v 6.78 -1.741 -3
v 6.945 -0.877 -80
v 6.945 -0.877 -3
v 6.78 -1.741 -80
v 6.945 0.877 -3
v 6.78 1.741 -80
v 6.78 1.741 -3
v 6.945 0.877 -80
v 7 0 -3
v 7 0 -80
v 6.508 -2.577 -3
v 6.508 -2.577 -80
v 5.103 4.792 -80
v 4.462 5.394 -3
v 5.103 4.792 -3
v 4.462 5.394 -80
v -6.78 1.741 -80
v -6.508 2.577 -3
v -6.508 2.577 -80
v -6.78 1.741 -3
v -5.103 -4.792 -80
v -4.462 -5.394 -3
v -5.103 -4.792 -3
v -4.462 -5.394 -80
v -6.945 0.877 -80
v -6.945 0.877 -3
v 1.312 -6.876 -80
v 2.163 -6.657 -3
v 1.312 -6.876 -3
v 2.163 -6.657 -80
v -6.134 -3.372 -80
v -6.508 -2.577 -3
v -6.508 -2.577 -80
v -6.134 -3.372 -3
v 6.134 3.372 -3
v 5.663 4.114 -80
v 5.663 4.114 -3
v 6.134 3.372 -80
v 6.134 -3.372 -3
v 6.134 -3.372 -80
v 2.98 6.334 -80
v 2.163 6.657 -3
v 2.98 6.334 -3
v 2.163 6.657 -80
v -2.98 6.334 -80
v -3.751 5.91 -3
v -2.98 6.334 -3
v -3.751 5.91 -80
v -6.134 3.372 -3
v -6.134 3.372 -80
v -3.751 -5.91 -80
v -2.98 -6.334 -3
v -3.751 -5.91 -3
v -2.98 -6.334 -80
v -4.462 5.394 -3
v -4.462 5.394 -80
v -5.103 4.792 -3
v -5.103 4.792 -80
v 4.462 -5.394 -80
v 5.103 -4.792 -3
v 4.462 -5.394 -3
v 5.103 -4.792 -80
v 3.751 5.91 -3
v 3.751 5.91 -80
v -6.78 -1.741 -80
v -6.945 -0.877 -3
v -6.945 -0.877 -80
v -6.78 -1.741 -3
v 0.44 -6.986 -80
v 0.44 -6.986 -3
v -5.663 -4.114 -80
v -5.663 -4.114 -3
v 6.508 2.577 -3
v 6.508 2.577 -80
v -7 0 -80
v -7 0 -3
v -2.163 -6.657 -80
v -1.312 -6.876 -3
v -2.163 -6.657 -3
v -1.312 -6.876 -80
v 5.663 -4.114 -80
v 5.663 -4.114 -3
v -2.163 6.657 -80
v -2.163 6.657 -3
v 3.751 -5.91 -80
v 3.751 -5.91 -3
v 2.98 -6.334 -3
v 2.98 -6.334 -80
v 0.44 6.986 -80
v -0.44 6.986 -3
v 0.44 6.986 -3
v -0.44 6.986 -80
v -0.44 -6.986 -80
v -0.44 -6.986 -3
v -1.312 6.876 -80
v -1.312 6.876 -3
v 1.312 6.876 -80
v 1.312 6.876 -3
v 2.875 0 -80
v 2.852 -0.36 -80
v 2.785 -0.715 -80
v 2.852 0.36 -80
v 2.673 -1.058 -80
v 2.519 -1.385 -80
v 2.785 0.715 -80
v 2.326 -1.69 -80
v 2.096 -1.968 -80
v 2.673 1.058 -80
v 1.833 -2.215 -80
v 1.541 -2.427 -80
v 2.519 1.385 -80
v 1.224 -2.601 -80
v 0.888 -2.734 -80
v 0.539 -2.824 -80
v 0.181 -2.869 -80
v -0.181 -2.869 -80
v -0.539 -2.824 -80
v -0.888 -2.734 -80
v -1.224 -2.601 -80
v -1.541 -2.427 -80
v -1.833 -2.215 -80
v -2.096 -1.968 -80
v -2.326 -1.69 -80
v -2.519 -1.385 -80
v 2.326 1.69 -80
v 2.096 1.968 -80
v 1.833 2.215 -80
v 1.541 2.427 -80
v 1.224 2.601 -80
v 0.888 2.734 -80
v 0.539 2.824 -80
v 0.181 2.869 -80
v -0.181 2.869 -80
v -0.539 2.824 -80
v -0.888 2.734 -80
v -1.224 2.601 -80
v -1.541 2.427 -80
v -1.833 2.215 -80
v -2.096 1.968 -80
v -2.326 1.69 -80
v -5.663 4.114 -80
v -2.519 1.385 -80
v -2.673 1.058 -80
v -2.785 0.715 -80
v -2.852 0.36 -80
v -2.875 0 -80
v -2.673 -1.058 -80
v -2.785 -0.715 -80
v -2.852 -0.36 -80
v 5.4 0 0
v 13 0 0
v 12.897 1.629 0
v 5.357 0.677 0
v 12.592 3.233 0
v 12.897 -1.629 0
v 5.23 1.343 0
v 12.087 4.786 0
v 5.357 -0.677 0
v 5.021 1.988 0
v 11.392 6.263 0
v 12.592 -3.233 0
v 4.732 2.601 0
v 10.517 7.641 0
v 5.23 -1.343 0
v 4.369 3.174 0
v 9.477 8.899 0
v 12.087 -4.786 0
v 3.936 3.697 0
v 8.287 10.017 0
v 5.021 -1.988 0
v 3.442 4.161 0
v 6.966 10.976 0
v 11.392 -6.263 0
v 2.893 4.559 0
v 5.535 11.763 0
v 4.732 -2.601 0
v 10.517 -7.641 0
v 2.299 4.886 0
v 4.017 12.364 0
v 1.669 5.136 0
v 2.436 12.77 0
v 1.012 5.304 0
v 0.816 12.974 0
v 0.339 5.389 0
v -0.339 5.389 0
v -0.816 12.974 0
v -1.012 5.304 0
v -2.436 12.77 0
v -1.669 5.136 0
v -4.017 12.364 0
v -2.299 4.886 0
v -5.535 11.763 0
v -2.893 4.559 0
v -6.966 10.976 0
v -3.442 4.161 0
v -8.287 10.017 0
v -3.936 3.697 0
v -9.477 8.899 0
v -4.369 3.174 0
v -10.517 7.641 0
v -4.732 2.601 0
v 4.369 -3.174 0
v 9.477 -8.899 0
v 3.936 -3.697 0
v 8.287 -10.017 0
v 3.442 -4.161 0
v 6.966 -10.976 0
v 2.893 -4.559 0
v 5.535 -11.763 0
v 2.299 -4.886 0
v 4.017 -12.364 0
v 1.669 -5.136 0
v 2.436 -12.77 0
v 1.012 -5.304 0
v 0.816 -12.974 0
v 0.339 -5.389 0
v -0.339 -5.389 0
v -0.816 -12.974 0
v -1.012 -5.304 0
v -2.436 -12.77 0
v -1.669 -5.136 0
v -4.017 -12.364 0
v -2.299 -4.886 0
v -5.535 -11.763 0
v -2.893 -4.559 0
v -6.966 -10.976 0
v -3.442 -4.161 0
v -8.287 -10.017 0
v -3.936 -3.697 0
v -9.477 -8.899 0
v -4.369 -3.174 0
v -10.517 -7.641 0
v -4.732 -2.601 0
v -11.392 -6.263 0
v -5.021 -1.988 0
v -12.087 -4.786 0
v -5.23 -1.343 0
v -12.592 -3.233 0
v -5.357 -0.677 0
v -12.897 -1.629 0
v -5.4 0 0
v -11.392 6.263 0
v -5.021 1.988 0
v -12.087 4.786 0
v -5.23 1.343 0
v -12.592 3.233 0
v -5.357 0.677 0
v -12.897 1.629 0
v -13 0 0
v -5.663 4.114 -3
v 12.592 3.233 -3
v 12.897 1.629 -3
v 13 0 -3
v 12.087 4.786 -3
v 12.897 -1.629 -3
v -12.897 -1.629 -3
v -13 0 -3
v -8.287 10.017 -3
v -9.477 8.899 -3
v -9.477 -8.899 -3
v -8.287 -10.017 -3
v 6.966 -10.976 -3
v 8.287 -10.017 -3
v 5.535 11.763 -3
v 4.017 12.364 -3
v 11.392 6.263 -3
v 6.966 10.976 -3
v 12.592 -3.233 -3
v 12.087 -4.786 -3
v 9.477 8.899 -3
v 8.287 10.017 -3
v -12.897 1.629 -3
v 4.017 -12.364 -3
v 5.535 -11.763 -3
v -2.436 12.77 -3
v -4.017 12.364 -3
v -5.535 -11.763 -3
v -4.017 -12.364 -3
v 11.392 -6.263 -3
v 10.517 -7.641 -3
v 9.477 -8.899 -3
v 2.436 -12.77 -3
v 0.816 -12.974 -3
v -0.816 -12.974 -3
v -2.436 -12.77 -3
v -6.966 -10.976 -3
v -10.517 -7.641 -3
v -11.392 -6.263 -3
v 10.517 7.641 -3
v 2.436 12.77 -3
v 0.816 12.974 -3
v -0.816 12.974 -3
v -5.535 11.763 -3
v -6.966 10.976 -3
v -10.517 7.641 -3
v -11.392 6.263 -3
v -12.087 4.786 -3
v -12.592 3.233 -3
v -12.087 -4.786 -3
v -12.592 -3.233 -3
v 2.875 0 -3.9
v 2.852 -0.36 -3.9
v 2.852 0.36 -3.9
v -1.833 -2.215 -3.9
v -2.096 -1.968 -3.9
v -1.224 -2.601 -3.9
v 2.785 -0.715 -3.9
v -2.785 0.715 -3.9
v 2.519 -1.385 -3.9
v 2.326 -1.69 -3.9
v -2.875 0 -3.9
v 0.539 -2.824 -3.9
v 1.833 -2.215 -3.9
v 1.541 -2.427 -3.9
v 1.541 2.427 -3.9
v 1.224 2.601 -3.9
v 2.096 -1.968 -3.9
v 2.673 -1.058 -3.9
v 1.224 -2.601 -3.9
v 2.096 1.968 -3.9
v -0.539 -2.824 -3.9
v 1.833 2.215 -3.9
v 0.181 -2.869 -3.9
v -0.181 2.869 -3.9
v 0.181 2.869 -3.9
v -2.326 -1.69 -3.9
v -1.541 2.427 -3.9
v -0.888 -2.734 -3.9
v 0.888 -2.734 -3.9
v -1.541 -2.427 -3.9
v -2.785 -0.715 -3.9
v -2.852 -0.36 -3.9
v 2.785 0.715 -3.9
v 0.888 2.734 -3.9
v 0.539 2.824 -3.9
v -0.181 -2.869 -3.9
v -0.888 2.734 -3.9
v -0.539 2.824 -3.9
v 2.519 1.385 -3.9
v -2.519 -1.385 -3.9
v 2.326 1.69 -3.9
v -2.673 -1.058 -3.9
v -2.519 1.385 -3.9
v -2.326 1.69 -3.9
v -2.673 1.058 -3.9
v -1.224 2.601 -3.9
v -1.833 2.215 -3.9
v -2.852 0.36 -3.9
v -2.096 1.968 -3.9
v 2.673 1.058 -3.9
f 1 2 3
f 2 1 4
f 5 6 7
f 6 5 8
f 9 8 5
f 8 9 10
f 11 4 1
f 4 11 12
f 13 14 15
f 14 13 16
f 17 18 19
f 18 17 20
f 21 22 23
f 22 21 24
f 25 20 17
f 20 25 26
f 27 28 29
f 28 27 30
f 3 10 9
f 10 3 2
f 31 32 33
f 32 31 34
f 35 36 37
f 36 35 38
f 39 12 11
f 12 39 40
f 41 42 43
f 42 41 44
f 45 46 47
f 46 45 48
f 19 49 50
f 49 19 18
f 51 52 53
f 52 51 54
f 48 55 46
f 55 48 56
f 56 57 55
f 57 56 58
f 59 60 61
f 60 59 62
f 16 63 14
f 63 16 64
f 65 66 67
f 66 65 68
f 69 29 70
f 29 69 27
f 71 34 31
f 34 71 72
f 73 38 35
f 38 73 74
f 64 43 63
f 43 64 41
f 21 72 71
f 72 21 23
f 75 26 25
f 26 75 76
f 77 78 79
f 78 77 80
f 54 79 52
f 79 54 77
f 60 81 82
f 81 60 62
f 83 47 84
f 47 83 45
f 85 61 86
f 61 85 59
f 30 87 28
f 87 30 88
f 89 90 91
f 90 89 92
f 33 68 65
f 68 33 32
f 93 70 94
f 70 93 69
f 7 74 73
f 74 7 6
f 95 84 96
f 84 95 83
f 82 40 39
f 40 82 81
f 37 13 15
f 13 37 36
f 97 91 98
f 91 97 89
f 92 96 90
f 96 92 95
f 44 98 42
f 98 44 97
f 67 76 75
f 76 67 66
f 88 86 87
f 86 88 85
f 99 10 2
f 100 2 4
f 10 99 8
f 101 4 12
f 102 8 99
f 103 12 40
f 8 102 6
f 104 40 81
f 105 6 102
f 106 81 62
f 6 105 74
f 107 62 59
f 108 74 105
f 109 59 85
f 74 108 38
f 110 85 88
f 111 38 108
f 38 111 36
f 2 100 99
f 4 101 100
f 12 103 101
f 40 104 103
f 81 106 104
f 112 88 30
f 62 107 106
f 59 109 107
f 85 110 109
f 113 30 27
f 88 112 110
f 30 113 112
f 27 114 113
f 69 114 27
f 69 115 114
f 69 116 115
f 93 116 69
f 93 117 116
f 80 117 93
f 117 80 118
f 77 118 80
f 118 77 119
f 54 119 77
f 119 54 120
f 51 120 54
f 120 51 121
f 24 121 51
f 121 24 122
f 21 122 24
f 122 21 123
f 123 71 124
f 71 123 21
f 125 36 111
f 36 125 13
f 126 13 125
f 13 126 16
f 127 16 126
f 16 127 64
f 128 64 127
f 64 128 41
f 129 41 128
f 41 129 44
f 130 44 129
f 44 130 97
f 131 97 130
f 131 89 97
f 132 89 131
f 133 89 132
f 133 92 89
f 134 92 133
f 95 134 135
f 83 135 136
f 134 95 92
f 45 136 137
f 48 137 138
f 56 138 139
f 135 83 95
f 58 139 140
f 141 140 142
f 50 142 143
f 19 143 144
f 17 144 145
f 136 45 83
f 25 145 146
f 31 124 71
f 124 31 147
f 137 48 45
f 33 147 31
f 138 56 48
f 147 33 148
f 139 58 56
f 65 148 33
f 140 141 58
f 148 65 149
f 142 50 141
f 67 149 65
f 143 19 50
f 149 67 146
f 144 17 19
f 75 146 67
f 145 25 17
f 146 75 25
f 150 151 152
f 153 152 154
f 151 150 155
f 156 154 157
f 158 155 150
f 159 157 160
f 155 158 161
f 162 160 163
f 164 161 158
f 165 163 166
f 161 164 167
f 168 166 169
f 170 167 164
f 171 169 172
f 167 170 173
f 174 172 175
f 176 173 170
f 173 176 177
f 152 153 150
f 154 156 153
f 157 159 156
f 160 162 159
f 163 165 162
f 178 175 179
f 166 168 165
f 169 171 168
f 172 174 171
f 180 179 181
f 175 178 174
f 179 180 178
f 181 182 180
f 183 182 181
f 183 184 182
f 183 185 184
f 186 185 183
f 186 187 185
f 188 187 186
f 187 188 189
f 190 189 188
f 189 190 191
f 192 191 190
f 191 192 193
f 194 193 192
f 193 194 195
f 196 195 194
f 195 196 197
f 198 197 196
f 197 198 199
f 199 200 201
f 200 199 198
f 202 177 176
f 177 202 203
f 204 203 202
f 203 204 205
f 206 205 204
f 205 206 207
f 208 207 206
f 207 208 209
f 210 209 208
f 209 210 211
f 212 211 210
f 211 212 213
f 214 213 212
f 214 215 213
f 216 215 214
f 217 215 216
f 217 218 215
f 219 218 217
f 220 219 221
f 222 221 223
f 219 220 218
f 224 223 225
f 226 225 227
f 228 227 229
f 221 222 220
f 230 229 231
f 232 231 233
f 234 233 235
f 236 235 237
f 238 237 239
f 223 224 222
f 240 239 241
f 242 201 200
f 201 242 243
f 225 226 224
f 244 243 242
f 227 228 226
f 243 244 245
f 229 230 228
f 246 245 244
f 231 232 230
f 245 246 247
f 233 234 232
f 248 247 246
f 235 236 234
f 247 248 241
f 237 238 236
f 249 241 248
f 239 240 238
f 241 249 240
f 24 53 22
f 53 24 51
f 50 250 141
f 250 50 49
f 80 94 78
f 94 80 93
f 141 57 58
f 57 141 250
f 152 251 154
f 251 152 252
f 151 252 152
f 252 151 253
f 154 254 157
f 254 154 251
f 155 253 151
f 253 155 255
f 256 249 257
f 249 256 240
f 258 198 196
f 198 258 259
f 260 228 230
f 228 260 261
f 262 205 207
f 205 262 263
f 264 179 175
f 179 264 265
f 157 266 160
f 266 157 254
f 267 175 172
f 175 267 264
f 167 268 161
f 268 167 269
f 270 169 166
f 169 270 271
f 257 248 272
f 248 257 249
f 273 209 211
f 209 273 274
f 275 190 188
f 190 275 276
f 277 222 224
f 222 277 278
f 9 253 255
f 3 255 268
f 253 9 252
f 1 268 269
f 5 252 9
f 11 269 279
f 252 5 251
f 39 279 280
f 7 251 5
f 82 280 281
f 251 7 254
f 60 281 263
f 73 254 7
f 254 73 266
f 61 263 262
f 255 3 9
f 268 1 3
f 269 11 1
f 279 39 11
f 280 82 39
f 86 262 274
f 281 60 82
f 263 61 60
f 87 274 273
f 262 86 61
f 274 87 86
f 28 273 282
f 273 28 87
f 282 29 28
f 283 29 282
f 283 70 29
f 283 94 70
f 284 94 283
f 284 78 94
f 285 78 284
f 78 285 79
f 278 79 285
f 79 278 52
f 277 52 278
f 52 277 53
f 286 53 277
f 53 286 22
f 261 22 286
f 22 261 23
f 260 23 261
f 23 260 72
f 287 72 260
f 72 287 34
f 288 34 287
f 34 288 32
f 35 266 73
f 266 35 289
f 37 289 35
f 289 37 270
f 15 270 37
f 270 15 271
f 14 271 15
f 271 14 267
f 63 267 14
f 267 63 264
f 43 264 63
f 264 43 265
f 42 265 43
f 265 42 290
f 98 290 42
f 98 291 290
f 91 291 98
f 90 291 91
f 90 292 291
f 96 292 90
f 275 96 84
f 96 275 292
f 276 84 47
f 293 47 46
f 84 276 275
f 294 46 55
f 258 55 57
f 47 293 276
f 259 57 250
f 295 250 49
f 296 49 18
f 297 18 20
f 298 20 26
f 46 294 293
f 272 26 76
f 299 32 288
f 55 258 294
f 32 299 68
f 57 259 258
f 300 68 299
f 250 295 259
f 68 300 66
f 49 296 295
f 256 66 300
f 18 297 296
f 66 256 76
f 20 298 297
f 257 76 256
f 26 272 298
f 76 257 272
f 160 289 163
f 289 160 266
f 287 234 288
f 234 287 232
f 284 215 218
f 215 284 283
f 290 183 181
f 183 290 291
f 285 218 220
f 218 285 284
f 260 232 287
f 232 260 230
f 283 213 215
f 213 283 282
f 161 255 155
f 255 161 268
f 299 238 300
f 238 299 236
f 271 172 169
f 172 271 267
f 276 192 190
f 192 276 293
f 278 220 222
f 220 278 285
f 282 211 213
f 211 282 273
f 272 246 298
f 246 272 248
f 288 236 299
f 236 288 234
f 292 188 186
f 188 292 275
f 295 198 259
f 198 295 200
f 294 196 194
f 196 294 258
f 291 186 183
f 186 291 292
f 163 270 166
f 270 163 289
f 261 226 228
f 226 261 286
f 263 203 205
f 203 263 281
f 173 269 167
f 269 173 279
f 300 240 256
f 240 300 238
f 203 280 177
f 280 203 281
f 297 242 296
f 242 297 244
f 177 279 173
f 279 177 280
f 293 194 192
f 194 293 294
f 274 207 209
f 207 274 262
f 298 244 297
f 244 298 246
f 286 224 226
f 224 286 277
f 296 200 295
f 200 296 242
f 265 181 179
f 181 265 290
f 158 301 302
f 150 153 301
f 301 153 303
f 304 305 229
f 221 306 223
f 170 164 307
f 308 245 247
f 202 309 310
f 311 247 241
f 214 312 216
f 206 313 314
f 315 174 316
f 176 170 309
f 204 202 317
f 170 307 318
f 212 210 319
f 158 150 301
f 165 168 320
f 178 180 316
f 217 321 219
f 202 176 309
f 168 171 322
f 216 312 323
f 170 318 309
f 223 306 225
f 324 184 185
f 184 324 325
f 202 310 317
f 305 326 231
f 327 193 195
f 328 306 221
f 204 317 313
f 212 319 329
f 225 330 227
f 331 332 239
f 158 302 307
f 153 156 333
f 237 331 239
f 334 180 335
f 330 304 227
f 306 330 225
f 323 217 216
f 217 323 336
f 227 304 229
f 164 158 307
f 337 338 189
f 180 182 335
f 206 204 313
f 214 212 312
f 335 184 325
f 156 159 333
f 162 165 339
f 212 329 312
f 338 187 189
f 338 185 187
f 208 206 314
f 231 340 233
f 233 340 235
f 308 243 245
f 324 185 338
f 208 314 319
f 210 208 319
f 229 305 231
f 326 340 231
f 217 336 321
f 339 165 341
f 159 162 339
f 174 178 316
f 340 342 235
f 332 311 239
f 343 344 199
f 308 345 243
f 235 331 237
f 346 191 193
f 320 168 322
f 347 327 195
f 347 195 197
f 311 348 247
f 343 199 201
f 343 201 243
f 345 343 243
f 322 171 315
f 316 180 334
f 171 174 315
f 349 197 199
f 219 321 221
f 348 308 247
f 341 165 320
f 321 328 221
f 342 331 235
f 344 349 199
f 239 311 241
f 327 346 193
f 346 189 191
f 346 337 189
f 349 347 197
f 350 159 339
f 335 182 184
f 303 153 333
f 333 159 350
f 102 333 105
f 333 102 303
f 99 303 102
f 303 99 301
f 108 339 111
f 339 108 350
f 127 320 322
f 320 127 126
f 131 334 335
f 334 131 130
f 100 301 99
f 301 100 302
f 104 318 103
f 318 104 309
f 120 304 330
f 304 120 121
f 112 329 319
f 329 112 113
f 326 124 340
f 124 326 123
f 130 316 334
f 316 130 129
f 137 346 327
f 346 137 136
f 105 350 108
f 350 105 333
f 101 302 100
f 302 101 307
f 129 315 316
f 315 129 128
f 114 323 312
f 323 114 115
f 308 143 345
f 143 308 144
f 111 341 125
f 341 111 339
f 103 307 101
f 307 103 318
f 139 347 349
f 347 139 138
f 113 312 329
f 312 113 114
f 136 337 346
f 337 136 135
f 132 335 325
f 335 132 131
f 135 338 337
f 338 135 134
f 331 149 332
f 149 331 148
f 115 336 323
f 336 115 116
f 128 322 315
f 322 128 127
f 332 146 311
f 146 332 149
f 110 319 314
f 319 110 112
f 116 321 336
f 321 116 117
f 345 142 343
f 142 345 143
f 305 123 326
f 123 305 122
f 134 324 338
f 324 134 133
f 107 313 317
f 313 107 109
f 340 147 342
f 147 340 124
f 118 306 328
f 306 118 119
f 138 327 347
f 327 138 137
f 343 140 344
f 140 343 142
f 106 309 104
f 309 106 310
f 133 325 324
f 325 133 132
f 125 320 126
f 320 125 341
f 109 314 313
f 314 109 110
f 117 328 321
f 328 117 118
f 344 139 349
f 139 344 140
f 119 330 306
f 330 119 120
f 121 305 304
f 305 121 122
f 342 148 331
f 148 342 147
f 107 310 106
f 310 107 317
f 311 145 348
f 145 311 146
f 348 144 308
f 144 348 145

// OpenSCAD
$fn = 50;


difference() {
	union() {
		translate(v = [0, 0, -80.0000000000]) {
			cylinder(h = 80, r = 7.0000000000);
		}
		translate(v = [0, 0, -3.0000000000]) {
			cylinder(h = 3, r = 13.0000000000);
		}
	}
	union() {
		translate(v = [0, 0, 0]) {
			rotate(a = [0, 0, 0]) {
				difference() {
					union() {
						#translate(v = [0, 0, -80.0000000000]) {
							cylinder(h = 80, r = 2.6000000000);
						}
						#translate(v = [0, 0, -3.9000000000]) {
							cylinder(h = 3.9000000000, r = 7.0000000000, r1 = 2.8750000000, r2 = 5.4000000000);
						}
						#translate(v = [0, 0, -80.0000000000]) {
							cylinder(h = 80, r = 2.8750000000);
						}
						#translate(v = [0, 0, -80.0000000000]) {
							cylinder(h = 80, r = 2.6000000000);
						}
					}
					union();
				}
			}
		}
	}
}
